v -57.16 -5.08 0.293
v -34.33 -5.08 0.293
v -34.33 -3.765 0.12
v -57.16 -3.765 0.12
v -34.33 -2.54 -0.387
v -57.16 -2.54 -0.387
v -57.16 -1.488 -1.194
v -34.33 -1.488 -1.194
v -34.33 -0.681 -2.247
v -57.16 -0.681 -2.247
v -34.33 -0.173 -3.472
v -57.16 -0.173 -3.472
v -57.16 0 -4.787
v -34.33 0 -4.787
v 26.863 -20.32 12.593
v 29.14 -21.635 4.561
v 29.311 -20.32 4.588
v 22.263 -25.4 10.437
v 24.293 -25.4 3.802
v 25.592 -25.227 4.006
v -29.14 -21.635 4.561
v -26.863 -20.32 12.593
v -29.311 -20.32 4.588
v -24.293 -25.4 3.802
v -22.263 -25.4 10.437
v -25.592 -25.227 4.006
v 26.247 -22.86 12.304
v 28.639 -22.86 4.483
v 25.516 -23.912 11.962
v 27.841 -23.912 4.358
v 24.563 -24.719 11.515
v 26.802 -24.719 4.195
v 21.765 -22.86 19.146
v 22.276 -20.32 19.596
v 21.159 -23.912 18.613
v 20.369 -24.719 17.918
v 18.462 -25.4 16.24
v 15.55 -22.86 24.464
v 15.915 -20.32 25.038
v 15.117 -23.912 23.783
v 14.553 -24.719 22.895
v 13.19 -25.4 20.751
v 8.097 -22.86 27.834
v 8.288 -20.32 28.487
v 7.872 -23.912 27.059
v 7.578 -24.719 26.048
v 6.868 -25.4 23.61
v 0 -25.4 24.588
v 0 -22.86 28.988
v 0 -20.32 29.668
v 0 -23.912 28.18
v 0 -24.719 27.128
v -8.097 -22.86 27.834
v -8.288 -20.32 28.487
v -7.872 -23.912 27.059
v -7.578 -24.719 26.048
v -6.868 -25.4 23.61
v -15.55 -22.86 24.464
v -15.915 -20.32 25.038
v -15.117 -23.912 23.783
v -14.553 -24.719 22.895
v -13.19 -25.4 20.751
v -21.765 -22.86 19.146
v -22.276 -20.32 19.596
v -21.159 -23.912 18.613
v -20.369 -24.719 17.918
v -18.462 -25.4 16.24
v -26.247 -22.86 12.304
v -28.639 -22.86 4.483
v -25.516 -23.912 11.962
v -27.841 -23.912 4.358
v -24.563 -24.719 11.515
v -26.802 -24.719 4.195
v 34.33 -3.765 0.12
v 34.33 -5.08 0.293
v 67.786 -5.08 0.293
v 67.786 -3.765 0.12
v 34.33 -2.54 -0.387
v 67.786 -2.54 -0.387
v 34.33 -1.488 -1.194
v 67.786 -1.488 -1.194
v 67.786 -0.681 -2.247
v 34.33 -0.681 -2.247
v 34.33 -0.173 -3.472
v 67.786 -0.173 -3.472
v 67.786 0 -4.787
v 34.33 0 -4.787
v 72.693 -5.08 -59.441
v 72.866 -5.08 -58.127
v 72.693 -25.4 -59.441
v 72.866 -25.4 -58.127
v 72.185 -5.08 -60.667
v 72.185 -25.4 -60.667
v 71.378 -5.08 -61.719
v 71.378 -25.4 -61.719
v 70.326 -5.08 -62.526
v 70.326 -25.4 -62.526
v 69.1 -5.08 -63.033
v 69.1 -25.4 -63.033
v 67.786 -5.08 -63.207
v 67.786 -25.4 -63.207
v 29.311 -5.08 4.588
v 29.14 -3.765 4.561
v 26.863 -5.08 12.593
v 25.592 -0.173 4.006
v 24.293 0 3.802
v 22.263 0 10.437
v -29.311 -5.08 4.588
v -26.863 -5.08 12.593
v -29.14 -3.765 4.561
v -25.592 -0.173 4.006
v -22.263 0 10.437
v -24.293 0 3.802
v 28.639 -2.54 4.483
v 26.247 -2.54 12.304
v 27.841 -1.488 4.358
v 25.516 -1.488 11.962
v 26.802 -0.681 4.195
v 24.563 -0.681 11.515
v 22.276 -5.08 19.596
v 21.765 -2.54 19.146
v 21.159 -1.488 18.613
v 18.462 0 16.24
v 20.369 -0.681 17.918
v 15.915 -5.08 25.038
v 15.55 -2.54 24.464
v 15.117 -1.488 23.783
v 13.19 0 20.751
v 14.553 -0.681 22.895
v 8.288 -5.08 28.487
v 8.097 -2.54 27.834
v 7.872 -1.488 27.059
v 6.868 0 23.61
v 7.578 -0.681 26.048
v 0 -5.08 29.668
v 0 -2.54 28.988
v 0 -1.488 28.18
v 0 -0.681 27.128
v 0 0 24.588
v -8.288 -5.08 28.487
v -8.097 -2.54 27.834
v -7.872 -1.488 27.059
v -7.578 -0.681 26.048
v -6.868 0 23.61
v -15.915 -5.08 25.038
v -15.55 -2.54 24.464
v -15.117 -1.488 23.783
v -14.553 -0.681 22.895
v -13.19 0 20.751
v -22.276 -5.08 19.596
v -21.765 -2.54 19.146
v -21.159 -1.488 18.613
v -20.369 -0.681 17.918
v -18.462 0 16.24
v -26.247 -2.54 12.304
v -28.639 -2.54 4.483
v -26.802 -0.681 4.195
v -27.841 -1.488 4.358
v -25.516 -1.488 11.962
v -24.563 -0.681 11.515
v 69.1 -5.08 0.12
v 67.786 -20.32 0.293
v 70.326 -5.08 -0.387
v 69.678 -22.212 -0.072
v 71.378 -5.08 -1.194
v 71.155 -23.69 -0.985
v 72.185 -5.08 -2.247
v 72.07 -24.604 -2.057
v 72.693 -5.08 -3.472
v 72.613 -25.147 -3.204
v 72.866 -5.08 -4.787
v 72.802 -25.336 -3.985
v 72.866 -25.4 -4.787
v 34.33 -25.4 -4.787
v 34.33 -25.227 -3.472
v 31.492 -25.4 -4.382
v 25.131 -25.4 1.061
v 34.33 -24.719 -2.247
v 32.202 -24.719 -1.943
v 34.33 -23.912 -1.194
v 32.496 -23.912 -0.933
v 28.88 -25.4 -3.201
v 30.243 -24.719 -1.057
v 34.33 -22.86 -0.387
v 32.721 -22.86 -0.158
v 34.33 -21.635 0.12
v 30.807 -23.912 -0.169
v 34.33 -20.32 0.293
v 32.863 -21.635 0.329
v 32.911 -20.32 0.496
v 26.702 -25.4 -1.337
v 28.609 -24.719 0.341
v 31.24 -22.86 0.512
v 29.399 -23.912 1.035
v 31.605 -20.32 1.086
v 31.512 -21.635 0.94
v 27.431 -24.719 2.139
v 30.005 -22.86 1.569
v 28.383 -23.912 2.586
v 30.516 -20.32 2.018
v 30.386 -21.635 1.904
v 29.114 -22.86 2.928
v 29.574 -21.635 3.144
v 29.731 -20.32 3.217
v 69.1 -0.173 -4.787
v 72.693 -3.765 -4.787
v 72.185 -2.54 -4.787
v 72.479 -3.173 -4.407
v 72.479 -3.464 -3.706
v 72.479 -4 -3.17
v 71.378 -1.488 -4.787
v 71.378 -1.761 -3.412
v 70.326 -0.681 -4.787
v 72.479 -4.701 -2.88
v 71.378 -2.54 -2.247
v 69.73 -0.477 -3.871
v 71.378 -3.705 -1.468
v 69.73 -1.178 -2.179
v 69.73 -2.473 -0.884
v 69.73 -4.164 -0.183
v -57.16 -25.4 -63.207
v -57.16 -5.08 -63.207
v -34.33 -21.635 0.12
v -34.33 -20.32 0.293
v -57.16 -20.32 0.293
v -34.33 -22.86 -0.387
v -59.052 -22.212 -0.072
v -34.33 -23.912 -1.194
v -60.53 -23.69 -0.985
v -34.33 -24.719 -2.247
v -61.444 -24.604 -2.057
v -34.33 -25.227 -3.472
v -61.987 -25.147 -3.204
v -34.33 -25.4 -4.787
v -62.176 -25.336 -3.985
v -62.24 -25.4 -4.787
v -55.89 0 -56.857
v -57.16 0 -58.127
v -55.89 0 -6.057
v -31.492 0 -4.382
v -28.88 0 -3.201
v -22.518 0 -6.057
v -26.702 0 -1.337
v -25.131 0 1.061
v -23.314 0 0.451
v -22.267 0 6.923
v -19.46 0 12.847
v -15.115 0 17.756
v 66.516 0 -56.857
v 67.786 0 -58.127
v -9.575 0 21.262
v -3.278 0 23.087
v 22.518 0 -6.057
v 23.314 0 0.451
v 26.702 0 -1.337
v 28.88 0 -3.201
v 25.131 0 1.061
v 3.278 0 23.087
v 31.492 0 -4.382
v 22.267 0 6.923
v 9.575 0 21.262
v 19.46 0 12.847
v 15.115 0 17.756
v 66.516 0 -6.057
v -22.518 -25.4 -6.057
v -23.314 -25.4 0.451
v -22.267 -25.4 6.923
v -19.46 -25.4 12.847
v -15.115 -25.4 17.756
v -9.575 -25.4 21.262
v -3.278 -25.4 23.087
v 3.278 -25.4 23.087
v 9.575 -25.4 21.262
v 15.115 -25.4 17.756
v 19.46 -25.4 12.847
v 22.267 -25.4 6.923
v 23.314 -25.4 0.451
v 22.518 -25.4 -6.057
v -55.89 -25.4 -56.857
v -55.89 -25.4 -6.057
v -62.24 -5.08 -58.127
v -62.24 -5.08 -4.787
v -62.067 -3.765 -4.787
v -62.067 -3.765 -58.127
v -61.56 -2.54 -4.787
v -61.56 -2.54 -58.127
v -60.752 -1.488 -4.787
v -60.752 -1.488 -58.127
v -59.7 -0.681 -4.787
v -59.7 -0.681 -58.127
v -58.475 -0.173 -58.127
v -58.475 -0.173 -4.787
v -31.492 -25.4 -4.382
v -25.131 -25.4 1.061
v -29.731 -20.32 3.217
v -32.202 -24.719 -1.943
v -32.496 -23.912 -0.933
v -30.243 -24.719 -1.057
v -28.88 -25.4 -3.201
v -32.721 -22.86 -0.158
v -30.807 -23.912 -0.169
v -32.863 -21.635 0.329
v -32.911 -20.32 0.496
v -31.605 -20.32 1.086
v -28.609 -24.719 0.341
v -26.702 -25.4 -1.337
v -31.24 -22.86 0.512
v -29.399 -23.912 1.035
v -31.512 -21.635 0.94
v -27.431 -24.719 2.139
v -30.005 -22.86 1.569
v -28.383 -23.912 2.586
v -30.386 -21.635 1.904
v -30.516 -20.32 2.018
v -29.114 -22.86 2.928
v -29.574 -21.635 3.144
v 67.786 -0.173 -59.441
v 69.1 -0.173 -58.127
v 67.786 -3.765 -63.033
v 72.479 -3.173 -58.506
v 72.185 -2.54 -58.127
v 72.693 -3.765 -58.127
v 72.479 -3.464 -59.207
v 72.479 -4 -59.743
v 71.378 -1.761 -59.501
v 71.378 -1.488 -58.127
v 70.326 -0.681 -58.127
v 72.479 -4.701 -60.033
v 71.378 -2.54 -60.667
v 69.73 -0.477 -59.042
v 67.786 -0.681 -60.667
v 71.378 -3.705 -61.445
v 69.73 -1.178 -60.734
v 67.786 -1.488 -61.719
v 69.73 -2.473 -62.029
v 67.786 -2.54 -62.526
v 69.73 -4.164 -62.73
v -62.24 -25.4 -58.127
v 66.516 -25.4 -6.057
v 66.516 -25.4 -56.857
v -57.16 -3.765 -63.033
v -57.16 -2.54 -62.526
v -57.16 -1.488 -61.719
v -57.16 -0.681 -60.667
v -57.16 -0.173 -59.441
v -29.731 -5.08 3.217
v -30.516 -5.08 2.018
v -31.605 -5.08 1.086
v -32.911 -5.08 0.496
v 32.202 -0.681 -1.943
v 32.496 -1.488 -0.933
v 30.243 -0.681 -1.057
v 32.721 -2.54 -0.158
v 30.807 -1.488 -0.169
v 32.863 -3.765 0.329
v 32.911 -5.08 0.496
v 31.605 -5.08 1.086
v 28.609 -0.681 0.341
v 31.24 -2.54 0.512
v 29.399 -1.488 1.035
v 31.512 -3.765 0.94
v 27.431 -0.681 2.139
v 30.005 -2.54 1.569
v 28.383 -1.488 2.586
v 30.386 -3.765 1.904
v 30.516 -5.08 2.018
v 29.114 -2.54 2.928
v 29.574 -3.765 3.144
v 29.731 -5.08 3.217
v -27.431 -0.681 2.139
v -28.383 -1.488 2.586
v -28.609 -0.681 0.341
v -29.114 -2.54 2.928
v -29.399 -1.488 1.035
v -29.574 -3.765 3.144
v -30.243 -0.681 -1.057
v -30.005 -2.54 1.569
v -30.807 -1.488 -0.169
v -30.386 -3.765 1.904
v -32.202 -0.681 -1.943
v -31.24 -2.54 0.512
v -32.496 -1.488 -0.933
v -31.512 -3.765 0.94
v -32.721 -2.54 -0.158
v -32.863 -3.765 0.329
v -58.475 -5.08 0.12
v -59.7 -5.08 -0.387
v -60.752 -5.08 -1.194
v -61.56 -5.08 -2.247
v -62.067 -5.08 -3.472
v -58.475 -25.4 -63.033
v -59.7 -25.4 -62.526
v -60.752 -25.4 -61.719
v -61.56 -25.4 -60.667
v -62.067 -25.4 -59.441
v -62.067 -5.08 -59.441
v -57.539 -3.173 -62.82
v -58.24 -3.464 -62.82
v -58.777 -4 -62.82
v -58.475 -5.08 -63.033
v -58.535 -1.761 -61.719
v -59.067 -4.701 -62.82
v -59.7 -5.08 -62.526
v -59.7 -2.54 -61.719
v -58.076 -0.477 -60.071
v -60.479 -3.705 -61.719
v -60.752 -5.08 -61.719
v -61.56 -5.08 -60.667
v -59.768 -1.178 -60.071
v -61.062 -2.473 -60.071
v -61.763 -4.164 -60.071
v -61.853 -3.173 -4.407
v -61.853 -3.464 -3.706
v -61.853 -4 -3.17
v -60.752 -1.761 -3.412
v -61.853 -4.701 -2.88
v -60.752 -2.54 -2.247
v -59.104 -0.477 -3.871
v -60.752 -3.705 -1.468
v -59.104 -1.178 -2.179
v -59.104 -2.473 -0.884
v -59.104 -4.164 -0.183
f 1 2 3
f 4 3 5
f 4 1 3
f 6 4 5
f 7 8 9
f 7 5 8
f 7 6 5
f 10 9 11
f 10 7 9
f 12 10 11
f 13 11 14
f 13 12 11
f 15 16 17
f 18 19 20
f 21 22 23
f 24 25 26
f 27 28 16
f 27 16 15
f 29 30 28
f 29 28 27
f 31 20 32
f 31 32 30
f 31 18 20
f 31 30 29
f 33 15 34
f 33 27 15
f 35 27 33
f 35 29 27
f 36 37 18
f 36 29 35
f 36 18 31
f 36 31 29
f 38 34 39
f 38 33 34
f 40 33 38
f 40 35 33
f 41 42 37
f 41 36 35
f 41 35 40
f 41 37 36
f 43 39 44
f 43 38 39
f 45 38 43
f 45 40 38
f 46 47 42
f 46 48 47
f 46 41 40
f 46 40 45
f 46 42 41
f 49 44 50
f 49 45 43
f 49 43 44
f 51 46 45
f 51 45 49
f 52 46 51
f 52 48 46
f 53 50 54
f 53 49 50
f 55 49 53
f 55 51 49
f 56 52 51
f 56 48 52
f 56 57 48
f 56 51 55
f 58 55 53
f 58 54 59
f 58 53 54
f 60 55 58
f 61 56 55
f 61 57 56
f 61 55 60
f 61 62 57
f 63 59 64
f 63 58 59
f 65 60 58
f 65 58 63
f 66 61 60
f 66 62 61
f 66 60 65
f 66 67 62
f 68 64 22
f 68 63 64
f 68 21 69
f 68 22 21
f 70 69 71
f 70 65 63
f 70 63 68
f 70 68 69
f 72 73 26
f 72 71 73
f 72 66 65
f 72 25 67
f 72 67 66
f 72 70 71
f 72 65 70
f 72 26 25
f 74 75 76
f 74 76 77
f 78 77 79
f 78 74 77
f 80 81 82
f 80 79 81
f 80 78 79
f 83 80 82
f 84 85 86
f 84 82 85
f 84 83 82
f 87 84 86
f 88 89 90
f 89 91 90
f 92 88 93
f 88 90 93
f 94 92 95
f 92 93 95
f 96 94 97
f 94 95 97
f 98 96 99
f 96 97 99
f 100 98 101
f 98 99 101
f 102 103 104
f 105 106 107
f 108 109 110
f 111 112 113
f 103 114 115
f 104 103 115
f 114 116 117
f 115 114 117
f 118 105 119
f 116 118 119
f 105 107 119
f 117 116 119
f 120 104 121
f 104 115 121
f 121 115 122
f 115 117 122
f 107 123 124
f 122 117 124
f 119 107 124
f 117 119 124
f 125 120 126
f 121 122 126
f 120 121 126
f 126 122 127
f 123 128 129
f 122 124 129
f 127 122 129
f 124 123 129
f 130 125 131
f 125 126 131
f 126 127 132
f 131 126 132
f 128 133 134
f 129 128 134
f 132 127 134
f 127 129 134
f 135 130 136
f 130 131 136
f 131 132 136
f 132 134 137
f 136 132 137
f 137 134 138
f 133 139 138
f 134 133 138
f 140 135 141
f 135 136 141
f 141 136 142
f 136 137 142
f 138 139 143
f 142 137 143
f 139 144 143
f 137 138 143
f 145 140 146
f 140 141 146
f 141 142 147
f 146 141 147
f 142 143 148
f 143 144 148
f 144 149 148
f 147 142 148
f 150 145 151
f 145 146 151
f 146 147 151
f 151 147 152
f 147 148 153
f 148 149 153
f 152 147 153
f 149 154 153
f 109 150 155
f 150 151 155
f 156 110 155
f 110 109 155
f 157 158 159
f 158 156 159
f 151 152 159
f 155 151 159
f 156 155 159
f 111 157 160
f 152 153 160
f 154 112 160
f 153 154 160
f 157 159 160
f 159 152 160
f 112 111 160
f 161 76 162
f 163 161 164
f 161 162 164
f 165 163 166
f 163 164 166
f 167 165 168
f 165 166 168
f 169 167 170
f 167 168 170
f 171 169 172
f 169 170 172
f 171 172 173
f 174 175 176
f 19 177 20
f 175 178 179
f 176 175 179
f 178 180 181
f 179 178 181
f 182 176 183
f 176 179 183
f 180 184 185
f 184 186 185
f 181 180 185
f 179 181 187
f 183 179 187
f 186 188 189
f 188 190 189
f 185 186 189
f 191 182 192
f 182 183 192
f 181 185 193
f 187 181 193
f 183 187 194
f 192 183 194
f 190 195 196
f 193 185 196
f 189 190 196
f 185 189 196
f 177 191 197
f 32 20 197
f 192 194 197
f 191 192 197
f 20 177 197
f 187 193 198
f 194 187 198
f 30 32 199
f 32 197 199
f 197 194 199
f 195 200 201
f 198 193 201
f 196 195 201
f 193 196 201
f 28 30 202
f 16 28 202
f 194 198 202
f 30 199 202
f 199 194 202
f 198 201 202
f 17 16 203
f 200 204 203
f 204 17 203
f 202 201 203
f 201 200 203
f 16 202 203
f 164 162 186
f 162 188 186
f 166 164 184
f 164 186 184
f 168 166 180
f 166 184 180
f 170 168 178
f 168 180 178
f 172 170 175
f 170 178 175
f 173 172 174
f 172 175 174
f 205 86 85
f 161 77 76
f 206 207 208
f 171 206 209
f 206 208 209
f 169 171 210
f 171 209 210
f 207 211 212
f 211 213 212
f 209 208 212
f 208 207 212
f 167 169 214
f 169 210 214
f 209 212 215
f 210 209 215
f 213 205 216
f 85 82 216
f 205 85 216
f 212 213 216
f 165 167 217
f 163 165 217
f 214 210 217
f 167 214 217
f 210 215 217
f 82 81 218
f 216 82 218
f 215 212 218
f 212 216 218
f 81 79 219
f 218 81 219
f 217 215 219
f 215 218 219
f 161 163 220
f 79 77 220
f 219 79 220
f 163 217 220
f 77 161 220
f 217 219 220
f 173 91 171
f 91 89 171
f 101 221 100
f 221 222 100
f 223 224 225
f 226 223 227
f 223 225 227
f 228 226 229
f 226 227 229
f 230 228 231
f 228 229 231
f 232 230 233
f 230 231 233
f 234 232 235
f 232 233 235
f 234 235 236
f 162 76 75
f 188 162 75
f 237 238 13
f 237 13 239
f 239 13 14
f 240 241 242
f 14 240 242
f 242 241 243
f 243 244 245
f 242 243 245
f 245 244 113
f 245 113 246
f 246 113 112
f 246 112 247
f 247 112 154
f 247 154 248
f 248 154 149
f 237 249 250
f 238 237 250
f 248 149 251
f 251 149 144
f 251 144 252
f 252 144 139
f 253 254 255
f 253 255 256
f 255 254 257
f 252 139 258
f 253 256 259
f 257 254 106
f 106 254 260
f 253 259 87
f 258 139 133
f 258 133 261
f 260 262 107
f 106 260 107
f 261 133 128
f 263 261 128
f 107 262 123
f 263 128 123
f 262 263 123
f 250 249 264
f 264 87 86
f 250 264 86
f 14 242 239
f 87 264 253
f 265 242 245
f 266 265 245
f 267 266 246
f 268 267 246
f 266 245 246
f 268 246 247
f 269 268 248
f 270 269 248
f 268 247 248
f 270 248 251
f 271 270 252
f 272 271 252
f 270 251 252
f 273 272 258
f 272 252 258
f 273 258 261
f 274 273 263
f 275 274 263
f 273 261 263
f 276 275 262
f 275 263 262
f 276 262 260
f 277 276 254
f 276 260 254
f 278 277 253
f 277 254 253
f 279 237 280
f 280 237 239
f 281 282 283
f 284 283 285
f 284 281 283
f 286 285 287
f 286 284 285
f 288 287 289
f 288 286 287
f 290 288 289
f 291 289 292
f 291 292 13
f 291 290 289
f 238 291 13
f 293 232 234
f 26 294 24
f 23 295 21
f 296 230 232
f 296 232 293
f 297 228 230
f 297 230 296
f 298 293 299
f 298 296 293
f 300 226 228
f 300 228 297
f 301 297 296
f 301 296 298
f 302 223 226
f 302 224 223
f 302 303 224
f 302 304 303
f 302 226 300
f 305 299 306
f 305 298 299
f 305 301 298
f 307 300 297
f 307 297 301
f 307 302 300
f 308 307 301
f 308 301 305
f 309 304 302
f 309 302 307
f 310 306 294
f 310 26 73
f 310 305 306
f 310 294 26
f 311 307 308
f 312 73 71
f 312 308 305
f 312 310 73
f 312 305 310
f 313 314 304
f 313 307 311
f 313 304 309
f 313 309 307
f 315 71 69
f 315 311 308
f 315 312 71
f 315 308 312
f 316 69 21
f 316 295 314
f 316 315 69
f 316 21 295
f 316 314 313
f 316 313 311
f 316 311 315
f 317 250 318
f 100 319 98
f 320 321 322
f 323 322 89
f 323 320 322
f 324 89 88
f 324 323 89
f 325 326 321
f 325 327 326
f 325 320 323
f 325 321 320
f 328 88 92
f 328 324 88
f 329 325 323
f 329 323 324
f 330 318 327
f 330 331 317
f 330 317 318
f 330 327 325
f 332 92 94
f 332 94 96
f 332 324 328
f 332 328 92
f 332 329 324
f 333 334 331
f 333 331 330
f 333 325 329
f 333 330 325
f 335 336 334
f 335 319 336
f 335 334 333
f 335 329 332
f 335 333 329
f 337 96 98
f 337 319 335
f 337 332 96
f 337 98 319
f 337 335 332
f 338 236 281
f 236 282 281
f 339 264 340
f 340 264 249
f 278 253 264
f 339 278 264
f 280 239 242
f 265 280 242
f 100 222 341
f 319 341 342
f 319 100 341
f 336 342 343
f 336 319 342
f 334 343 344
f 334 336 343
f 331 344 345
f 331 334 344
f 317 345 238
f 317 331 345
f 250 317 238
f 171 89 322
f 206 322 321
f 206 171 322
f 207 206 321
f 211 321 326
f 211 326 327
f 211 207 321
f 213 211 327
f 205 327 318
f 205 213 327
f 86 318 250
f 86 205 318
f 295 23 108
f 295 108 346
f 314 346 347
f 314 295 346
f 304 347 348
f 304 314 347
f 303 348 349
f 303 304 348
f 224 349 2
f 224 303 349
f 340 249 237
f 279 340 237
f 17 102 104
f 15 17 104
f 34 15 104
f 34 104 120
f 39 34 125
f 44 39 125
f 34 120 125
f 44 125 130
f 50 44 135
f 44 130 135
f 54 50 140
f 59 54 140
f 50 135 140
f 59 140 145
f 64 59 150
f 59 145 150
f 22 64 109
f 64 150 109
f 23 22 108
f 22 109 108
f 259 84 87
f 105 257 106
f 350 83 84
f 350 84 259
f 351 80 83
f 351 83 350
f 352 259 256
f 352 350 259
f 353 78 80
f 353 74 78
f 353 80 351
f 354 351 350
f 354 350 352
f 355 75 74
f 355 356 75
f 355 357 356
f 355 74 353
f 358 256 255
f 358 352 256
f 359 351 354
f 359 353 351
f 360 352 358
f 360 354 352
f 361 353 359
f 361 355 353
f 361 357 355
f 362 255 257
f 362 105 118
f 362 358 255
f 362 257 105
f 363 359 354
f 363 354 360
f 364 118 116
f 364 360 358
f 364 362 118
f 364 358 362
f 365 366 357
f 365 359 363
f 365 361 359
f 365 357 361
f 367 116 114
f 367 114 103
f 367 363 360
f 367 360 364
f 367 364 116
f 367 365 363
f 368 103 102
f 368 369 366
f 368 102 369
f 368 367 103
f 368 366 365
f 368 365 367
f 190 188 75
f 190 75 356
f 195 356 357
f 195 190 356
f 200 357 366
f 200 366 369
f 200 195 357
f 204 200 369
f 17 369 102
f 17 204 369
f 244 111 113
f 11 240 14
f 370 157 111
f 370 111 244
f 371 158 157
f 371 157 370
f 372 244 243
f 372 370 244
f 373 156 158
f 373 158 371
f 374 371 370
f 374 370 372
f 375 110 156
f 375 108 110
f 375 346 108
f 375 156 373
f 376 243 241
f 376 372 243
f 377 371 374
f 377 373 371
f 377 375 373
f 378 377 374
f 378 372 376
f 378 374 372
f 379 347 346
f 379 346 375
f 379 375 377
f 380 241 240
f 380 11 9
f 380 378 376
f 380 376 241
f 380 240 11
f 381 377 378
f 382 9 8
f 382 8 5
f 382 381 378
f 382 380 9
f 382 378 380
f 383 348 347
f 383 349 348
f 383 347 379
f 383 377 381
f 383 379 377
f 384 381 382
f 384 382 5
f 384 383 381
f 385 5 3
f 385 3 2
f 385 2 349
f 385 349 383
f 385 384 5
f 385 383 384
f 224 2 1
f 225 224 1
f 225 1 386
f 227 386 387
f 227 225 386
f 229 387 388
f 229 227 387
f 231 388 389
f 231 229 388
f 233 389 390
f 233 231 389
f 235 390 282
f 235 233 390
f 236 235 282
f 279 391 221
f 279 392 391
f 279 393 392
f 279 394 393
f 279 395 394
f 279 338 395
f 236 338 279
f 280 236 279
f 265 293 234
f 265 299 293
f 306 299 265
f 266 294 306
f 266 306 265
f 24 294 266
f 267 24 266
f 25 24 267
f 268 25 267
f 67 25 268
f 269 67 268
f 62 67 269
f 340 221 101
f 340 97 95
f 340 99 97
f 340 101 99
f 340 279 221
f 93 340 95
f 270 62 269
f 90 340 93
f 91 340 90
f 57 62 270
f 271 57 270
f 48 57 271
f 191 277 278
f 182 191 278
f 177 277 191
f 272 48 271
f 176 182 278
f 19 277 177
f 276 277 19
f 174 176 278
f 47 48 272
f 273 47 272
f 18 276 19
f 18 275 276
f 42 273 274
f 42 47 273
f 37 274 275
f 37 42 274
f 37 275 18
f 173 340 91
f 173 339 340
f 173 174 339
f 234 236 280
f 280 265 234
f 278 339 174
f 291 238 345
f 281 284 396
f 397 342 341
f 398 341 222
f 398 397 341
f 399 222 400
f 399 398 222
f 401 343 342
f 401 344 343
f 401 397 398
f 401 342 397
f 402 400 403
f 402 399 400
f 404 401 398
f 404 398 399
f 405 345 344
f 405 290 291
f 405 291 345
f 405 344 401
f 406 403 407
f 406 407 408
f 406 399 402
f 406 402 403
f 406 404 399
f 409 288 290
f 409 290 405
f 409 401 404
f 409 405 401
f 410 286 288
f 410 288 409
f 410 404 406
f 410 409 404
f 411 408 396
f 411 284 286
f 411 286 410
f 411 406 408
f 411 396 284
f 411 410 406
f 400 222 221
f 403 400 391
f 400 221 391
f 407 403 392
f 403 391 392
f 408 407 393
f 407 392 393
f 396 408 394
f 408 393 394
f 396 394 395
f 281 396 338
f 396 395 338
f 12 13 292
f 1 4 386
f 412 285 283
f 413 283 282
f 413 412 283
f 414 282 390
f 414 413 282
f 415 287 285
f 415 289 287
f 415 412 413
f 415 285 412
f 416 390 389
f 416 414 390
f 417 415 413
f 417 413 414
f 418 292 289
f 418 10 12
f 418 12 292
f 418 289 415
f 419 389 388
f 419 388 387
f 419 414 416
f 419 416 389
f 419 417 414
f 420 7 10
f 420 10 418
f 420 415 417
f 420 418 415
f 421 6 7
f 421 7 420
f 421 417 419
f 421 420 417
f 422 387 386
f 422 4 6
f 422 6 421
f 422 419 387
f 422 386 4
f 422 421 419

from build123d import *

# Parameters (mm, degrees)
F1_DEPTH = 25.4
F2_R     = 5.08


with BuildPart() as f1:
    # F0 (on Front) → F1 (new body)
    with BuildSketch(Plane.XZ):
        with BuildLine():
            Line((72.8656170726, 0.2934658736), (29.6668574194, 0.2934658736))
            ThreePointArc((29.6668574194, 0.2934658736), (0, 29.6683088726), (-29.6668574194, 0.2934658736))
            Line((-29.6668574194, 0.2934658736), (-62.2401205659, 0.2934658736))
            Line((-62.2401205659, 0.2934658736), (-62.2401205659, -63.2065341264))
            Line((-62.2401205659, -63.2065341264), (72.8656170726, -63.2065341264))
            Line((72.8656170726, -63.2065341264), (72.8656170726, 0.2934658736))
        make_face()
        with BuildLine():
            ThreePointArc((-22.5180355061, -6.0565341264), (0, 23.3183088726), (22.5180355061, -6.0565341264))
            Line((22.5180355061, -6.0565341264), (66.5156170726, -6.0565341264))
            Line((66.5156170726, -6.0565341264), (66.5156170726, -56.8565341264))
            Line((66.5156170726, -56.8565341264), (-55.8901205659, -56.8565341264))
            Line((-55.8901205659, -56.8565341264), (-55.8901205659, -6.0565341264))
            Line((-55.8901205659, -6.0565341264), (-22.5180355061, -6.0565341264))
        make_face(mode=Mode.SUBTRACT)
    extrude(amount=F1_DEPTH)

    # F2
    f2_edges = [f1.edges().sort_by_distance(p)[0] for p in [
        (51.266237, 0, 0.293466),
        (0, 0, 29.668309),
        (-45.953489, 0, 0.293466),
        (-62.240121, 0, -31.456534),
        (5.312748, 0, -63.206534),
        (72.865617, 0, -31.456534),
        (72.865617, -12.7, 0.293466),
        (-62.240121, -12.7, 0.293466),
        (29.666857, -12.7, 0.293466),
        (-29.666857, -12.7, 0.293466),
        (-45.953489, -25.4, 0.293466),
        (-62.240121, -12.7, -63.206534),
        (72.865617, -12.7, -63.206534),
        (51.266237, -25.4, 0.293466),
        (0, -25.4, 29.668309),
    ]]
    fillet(f2_edges, radius=F2_R)


solid = f1.part
